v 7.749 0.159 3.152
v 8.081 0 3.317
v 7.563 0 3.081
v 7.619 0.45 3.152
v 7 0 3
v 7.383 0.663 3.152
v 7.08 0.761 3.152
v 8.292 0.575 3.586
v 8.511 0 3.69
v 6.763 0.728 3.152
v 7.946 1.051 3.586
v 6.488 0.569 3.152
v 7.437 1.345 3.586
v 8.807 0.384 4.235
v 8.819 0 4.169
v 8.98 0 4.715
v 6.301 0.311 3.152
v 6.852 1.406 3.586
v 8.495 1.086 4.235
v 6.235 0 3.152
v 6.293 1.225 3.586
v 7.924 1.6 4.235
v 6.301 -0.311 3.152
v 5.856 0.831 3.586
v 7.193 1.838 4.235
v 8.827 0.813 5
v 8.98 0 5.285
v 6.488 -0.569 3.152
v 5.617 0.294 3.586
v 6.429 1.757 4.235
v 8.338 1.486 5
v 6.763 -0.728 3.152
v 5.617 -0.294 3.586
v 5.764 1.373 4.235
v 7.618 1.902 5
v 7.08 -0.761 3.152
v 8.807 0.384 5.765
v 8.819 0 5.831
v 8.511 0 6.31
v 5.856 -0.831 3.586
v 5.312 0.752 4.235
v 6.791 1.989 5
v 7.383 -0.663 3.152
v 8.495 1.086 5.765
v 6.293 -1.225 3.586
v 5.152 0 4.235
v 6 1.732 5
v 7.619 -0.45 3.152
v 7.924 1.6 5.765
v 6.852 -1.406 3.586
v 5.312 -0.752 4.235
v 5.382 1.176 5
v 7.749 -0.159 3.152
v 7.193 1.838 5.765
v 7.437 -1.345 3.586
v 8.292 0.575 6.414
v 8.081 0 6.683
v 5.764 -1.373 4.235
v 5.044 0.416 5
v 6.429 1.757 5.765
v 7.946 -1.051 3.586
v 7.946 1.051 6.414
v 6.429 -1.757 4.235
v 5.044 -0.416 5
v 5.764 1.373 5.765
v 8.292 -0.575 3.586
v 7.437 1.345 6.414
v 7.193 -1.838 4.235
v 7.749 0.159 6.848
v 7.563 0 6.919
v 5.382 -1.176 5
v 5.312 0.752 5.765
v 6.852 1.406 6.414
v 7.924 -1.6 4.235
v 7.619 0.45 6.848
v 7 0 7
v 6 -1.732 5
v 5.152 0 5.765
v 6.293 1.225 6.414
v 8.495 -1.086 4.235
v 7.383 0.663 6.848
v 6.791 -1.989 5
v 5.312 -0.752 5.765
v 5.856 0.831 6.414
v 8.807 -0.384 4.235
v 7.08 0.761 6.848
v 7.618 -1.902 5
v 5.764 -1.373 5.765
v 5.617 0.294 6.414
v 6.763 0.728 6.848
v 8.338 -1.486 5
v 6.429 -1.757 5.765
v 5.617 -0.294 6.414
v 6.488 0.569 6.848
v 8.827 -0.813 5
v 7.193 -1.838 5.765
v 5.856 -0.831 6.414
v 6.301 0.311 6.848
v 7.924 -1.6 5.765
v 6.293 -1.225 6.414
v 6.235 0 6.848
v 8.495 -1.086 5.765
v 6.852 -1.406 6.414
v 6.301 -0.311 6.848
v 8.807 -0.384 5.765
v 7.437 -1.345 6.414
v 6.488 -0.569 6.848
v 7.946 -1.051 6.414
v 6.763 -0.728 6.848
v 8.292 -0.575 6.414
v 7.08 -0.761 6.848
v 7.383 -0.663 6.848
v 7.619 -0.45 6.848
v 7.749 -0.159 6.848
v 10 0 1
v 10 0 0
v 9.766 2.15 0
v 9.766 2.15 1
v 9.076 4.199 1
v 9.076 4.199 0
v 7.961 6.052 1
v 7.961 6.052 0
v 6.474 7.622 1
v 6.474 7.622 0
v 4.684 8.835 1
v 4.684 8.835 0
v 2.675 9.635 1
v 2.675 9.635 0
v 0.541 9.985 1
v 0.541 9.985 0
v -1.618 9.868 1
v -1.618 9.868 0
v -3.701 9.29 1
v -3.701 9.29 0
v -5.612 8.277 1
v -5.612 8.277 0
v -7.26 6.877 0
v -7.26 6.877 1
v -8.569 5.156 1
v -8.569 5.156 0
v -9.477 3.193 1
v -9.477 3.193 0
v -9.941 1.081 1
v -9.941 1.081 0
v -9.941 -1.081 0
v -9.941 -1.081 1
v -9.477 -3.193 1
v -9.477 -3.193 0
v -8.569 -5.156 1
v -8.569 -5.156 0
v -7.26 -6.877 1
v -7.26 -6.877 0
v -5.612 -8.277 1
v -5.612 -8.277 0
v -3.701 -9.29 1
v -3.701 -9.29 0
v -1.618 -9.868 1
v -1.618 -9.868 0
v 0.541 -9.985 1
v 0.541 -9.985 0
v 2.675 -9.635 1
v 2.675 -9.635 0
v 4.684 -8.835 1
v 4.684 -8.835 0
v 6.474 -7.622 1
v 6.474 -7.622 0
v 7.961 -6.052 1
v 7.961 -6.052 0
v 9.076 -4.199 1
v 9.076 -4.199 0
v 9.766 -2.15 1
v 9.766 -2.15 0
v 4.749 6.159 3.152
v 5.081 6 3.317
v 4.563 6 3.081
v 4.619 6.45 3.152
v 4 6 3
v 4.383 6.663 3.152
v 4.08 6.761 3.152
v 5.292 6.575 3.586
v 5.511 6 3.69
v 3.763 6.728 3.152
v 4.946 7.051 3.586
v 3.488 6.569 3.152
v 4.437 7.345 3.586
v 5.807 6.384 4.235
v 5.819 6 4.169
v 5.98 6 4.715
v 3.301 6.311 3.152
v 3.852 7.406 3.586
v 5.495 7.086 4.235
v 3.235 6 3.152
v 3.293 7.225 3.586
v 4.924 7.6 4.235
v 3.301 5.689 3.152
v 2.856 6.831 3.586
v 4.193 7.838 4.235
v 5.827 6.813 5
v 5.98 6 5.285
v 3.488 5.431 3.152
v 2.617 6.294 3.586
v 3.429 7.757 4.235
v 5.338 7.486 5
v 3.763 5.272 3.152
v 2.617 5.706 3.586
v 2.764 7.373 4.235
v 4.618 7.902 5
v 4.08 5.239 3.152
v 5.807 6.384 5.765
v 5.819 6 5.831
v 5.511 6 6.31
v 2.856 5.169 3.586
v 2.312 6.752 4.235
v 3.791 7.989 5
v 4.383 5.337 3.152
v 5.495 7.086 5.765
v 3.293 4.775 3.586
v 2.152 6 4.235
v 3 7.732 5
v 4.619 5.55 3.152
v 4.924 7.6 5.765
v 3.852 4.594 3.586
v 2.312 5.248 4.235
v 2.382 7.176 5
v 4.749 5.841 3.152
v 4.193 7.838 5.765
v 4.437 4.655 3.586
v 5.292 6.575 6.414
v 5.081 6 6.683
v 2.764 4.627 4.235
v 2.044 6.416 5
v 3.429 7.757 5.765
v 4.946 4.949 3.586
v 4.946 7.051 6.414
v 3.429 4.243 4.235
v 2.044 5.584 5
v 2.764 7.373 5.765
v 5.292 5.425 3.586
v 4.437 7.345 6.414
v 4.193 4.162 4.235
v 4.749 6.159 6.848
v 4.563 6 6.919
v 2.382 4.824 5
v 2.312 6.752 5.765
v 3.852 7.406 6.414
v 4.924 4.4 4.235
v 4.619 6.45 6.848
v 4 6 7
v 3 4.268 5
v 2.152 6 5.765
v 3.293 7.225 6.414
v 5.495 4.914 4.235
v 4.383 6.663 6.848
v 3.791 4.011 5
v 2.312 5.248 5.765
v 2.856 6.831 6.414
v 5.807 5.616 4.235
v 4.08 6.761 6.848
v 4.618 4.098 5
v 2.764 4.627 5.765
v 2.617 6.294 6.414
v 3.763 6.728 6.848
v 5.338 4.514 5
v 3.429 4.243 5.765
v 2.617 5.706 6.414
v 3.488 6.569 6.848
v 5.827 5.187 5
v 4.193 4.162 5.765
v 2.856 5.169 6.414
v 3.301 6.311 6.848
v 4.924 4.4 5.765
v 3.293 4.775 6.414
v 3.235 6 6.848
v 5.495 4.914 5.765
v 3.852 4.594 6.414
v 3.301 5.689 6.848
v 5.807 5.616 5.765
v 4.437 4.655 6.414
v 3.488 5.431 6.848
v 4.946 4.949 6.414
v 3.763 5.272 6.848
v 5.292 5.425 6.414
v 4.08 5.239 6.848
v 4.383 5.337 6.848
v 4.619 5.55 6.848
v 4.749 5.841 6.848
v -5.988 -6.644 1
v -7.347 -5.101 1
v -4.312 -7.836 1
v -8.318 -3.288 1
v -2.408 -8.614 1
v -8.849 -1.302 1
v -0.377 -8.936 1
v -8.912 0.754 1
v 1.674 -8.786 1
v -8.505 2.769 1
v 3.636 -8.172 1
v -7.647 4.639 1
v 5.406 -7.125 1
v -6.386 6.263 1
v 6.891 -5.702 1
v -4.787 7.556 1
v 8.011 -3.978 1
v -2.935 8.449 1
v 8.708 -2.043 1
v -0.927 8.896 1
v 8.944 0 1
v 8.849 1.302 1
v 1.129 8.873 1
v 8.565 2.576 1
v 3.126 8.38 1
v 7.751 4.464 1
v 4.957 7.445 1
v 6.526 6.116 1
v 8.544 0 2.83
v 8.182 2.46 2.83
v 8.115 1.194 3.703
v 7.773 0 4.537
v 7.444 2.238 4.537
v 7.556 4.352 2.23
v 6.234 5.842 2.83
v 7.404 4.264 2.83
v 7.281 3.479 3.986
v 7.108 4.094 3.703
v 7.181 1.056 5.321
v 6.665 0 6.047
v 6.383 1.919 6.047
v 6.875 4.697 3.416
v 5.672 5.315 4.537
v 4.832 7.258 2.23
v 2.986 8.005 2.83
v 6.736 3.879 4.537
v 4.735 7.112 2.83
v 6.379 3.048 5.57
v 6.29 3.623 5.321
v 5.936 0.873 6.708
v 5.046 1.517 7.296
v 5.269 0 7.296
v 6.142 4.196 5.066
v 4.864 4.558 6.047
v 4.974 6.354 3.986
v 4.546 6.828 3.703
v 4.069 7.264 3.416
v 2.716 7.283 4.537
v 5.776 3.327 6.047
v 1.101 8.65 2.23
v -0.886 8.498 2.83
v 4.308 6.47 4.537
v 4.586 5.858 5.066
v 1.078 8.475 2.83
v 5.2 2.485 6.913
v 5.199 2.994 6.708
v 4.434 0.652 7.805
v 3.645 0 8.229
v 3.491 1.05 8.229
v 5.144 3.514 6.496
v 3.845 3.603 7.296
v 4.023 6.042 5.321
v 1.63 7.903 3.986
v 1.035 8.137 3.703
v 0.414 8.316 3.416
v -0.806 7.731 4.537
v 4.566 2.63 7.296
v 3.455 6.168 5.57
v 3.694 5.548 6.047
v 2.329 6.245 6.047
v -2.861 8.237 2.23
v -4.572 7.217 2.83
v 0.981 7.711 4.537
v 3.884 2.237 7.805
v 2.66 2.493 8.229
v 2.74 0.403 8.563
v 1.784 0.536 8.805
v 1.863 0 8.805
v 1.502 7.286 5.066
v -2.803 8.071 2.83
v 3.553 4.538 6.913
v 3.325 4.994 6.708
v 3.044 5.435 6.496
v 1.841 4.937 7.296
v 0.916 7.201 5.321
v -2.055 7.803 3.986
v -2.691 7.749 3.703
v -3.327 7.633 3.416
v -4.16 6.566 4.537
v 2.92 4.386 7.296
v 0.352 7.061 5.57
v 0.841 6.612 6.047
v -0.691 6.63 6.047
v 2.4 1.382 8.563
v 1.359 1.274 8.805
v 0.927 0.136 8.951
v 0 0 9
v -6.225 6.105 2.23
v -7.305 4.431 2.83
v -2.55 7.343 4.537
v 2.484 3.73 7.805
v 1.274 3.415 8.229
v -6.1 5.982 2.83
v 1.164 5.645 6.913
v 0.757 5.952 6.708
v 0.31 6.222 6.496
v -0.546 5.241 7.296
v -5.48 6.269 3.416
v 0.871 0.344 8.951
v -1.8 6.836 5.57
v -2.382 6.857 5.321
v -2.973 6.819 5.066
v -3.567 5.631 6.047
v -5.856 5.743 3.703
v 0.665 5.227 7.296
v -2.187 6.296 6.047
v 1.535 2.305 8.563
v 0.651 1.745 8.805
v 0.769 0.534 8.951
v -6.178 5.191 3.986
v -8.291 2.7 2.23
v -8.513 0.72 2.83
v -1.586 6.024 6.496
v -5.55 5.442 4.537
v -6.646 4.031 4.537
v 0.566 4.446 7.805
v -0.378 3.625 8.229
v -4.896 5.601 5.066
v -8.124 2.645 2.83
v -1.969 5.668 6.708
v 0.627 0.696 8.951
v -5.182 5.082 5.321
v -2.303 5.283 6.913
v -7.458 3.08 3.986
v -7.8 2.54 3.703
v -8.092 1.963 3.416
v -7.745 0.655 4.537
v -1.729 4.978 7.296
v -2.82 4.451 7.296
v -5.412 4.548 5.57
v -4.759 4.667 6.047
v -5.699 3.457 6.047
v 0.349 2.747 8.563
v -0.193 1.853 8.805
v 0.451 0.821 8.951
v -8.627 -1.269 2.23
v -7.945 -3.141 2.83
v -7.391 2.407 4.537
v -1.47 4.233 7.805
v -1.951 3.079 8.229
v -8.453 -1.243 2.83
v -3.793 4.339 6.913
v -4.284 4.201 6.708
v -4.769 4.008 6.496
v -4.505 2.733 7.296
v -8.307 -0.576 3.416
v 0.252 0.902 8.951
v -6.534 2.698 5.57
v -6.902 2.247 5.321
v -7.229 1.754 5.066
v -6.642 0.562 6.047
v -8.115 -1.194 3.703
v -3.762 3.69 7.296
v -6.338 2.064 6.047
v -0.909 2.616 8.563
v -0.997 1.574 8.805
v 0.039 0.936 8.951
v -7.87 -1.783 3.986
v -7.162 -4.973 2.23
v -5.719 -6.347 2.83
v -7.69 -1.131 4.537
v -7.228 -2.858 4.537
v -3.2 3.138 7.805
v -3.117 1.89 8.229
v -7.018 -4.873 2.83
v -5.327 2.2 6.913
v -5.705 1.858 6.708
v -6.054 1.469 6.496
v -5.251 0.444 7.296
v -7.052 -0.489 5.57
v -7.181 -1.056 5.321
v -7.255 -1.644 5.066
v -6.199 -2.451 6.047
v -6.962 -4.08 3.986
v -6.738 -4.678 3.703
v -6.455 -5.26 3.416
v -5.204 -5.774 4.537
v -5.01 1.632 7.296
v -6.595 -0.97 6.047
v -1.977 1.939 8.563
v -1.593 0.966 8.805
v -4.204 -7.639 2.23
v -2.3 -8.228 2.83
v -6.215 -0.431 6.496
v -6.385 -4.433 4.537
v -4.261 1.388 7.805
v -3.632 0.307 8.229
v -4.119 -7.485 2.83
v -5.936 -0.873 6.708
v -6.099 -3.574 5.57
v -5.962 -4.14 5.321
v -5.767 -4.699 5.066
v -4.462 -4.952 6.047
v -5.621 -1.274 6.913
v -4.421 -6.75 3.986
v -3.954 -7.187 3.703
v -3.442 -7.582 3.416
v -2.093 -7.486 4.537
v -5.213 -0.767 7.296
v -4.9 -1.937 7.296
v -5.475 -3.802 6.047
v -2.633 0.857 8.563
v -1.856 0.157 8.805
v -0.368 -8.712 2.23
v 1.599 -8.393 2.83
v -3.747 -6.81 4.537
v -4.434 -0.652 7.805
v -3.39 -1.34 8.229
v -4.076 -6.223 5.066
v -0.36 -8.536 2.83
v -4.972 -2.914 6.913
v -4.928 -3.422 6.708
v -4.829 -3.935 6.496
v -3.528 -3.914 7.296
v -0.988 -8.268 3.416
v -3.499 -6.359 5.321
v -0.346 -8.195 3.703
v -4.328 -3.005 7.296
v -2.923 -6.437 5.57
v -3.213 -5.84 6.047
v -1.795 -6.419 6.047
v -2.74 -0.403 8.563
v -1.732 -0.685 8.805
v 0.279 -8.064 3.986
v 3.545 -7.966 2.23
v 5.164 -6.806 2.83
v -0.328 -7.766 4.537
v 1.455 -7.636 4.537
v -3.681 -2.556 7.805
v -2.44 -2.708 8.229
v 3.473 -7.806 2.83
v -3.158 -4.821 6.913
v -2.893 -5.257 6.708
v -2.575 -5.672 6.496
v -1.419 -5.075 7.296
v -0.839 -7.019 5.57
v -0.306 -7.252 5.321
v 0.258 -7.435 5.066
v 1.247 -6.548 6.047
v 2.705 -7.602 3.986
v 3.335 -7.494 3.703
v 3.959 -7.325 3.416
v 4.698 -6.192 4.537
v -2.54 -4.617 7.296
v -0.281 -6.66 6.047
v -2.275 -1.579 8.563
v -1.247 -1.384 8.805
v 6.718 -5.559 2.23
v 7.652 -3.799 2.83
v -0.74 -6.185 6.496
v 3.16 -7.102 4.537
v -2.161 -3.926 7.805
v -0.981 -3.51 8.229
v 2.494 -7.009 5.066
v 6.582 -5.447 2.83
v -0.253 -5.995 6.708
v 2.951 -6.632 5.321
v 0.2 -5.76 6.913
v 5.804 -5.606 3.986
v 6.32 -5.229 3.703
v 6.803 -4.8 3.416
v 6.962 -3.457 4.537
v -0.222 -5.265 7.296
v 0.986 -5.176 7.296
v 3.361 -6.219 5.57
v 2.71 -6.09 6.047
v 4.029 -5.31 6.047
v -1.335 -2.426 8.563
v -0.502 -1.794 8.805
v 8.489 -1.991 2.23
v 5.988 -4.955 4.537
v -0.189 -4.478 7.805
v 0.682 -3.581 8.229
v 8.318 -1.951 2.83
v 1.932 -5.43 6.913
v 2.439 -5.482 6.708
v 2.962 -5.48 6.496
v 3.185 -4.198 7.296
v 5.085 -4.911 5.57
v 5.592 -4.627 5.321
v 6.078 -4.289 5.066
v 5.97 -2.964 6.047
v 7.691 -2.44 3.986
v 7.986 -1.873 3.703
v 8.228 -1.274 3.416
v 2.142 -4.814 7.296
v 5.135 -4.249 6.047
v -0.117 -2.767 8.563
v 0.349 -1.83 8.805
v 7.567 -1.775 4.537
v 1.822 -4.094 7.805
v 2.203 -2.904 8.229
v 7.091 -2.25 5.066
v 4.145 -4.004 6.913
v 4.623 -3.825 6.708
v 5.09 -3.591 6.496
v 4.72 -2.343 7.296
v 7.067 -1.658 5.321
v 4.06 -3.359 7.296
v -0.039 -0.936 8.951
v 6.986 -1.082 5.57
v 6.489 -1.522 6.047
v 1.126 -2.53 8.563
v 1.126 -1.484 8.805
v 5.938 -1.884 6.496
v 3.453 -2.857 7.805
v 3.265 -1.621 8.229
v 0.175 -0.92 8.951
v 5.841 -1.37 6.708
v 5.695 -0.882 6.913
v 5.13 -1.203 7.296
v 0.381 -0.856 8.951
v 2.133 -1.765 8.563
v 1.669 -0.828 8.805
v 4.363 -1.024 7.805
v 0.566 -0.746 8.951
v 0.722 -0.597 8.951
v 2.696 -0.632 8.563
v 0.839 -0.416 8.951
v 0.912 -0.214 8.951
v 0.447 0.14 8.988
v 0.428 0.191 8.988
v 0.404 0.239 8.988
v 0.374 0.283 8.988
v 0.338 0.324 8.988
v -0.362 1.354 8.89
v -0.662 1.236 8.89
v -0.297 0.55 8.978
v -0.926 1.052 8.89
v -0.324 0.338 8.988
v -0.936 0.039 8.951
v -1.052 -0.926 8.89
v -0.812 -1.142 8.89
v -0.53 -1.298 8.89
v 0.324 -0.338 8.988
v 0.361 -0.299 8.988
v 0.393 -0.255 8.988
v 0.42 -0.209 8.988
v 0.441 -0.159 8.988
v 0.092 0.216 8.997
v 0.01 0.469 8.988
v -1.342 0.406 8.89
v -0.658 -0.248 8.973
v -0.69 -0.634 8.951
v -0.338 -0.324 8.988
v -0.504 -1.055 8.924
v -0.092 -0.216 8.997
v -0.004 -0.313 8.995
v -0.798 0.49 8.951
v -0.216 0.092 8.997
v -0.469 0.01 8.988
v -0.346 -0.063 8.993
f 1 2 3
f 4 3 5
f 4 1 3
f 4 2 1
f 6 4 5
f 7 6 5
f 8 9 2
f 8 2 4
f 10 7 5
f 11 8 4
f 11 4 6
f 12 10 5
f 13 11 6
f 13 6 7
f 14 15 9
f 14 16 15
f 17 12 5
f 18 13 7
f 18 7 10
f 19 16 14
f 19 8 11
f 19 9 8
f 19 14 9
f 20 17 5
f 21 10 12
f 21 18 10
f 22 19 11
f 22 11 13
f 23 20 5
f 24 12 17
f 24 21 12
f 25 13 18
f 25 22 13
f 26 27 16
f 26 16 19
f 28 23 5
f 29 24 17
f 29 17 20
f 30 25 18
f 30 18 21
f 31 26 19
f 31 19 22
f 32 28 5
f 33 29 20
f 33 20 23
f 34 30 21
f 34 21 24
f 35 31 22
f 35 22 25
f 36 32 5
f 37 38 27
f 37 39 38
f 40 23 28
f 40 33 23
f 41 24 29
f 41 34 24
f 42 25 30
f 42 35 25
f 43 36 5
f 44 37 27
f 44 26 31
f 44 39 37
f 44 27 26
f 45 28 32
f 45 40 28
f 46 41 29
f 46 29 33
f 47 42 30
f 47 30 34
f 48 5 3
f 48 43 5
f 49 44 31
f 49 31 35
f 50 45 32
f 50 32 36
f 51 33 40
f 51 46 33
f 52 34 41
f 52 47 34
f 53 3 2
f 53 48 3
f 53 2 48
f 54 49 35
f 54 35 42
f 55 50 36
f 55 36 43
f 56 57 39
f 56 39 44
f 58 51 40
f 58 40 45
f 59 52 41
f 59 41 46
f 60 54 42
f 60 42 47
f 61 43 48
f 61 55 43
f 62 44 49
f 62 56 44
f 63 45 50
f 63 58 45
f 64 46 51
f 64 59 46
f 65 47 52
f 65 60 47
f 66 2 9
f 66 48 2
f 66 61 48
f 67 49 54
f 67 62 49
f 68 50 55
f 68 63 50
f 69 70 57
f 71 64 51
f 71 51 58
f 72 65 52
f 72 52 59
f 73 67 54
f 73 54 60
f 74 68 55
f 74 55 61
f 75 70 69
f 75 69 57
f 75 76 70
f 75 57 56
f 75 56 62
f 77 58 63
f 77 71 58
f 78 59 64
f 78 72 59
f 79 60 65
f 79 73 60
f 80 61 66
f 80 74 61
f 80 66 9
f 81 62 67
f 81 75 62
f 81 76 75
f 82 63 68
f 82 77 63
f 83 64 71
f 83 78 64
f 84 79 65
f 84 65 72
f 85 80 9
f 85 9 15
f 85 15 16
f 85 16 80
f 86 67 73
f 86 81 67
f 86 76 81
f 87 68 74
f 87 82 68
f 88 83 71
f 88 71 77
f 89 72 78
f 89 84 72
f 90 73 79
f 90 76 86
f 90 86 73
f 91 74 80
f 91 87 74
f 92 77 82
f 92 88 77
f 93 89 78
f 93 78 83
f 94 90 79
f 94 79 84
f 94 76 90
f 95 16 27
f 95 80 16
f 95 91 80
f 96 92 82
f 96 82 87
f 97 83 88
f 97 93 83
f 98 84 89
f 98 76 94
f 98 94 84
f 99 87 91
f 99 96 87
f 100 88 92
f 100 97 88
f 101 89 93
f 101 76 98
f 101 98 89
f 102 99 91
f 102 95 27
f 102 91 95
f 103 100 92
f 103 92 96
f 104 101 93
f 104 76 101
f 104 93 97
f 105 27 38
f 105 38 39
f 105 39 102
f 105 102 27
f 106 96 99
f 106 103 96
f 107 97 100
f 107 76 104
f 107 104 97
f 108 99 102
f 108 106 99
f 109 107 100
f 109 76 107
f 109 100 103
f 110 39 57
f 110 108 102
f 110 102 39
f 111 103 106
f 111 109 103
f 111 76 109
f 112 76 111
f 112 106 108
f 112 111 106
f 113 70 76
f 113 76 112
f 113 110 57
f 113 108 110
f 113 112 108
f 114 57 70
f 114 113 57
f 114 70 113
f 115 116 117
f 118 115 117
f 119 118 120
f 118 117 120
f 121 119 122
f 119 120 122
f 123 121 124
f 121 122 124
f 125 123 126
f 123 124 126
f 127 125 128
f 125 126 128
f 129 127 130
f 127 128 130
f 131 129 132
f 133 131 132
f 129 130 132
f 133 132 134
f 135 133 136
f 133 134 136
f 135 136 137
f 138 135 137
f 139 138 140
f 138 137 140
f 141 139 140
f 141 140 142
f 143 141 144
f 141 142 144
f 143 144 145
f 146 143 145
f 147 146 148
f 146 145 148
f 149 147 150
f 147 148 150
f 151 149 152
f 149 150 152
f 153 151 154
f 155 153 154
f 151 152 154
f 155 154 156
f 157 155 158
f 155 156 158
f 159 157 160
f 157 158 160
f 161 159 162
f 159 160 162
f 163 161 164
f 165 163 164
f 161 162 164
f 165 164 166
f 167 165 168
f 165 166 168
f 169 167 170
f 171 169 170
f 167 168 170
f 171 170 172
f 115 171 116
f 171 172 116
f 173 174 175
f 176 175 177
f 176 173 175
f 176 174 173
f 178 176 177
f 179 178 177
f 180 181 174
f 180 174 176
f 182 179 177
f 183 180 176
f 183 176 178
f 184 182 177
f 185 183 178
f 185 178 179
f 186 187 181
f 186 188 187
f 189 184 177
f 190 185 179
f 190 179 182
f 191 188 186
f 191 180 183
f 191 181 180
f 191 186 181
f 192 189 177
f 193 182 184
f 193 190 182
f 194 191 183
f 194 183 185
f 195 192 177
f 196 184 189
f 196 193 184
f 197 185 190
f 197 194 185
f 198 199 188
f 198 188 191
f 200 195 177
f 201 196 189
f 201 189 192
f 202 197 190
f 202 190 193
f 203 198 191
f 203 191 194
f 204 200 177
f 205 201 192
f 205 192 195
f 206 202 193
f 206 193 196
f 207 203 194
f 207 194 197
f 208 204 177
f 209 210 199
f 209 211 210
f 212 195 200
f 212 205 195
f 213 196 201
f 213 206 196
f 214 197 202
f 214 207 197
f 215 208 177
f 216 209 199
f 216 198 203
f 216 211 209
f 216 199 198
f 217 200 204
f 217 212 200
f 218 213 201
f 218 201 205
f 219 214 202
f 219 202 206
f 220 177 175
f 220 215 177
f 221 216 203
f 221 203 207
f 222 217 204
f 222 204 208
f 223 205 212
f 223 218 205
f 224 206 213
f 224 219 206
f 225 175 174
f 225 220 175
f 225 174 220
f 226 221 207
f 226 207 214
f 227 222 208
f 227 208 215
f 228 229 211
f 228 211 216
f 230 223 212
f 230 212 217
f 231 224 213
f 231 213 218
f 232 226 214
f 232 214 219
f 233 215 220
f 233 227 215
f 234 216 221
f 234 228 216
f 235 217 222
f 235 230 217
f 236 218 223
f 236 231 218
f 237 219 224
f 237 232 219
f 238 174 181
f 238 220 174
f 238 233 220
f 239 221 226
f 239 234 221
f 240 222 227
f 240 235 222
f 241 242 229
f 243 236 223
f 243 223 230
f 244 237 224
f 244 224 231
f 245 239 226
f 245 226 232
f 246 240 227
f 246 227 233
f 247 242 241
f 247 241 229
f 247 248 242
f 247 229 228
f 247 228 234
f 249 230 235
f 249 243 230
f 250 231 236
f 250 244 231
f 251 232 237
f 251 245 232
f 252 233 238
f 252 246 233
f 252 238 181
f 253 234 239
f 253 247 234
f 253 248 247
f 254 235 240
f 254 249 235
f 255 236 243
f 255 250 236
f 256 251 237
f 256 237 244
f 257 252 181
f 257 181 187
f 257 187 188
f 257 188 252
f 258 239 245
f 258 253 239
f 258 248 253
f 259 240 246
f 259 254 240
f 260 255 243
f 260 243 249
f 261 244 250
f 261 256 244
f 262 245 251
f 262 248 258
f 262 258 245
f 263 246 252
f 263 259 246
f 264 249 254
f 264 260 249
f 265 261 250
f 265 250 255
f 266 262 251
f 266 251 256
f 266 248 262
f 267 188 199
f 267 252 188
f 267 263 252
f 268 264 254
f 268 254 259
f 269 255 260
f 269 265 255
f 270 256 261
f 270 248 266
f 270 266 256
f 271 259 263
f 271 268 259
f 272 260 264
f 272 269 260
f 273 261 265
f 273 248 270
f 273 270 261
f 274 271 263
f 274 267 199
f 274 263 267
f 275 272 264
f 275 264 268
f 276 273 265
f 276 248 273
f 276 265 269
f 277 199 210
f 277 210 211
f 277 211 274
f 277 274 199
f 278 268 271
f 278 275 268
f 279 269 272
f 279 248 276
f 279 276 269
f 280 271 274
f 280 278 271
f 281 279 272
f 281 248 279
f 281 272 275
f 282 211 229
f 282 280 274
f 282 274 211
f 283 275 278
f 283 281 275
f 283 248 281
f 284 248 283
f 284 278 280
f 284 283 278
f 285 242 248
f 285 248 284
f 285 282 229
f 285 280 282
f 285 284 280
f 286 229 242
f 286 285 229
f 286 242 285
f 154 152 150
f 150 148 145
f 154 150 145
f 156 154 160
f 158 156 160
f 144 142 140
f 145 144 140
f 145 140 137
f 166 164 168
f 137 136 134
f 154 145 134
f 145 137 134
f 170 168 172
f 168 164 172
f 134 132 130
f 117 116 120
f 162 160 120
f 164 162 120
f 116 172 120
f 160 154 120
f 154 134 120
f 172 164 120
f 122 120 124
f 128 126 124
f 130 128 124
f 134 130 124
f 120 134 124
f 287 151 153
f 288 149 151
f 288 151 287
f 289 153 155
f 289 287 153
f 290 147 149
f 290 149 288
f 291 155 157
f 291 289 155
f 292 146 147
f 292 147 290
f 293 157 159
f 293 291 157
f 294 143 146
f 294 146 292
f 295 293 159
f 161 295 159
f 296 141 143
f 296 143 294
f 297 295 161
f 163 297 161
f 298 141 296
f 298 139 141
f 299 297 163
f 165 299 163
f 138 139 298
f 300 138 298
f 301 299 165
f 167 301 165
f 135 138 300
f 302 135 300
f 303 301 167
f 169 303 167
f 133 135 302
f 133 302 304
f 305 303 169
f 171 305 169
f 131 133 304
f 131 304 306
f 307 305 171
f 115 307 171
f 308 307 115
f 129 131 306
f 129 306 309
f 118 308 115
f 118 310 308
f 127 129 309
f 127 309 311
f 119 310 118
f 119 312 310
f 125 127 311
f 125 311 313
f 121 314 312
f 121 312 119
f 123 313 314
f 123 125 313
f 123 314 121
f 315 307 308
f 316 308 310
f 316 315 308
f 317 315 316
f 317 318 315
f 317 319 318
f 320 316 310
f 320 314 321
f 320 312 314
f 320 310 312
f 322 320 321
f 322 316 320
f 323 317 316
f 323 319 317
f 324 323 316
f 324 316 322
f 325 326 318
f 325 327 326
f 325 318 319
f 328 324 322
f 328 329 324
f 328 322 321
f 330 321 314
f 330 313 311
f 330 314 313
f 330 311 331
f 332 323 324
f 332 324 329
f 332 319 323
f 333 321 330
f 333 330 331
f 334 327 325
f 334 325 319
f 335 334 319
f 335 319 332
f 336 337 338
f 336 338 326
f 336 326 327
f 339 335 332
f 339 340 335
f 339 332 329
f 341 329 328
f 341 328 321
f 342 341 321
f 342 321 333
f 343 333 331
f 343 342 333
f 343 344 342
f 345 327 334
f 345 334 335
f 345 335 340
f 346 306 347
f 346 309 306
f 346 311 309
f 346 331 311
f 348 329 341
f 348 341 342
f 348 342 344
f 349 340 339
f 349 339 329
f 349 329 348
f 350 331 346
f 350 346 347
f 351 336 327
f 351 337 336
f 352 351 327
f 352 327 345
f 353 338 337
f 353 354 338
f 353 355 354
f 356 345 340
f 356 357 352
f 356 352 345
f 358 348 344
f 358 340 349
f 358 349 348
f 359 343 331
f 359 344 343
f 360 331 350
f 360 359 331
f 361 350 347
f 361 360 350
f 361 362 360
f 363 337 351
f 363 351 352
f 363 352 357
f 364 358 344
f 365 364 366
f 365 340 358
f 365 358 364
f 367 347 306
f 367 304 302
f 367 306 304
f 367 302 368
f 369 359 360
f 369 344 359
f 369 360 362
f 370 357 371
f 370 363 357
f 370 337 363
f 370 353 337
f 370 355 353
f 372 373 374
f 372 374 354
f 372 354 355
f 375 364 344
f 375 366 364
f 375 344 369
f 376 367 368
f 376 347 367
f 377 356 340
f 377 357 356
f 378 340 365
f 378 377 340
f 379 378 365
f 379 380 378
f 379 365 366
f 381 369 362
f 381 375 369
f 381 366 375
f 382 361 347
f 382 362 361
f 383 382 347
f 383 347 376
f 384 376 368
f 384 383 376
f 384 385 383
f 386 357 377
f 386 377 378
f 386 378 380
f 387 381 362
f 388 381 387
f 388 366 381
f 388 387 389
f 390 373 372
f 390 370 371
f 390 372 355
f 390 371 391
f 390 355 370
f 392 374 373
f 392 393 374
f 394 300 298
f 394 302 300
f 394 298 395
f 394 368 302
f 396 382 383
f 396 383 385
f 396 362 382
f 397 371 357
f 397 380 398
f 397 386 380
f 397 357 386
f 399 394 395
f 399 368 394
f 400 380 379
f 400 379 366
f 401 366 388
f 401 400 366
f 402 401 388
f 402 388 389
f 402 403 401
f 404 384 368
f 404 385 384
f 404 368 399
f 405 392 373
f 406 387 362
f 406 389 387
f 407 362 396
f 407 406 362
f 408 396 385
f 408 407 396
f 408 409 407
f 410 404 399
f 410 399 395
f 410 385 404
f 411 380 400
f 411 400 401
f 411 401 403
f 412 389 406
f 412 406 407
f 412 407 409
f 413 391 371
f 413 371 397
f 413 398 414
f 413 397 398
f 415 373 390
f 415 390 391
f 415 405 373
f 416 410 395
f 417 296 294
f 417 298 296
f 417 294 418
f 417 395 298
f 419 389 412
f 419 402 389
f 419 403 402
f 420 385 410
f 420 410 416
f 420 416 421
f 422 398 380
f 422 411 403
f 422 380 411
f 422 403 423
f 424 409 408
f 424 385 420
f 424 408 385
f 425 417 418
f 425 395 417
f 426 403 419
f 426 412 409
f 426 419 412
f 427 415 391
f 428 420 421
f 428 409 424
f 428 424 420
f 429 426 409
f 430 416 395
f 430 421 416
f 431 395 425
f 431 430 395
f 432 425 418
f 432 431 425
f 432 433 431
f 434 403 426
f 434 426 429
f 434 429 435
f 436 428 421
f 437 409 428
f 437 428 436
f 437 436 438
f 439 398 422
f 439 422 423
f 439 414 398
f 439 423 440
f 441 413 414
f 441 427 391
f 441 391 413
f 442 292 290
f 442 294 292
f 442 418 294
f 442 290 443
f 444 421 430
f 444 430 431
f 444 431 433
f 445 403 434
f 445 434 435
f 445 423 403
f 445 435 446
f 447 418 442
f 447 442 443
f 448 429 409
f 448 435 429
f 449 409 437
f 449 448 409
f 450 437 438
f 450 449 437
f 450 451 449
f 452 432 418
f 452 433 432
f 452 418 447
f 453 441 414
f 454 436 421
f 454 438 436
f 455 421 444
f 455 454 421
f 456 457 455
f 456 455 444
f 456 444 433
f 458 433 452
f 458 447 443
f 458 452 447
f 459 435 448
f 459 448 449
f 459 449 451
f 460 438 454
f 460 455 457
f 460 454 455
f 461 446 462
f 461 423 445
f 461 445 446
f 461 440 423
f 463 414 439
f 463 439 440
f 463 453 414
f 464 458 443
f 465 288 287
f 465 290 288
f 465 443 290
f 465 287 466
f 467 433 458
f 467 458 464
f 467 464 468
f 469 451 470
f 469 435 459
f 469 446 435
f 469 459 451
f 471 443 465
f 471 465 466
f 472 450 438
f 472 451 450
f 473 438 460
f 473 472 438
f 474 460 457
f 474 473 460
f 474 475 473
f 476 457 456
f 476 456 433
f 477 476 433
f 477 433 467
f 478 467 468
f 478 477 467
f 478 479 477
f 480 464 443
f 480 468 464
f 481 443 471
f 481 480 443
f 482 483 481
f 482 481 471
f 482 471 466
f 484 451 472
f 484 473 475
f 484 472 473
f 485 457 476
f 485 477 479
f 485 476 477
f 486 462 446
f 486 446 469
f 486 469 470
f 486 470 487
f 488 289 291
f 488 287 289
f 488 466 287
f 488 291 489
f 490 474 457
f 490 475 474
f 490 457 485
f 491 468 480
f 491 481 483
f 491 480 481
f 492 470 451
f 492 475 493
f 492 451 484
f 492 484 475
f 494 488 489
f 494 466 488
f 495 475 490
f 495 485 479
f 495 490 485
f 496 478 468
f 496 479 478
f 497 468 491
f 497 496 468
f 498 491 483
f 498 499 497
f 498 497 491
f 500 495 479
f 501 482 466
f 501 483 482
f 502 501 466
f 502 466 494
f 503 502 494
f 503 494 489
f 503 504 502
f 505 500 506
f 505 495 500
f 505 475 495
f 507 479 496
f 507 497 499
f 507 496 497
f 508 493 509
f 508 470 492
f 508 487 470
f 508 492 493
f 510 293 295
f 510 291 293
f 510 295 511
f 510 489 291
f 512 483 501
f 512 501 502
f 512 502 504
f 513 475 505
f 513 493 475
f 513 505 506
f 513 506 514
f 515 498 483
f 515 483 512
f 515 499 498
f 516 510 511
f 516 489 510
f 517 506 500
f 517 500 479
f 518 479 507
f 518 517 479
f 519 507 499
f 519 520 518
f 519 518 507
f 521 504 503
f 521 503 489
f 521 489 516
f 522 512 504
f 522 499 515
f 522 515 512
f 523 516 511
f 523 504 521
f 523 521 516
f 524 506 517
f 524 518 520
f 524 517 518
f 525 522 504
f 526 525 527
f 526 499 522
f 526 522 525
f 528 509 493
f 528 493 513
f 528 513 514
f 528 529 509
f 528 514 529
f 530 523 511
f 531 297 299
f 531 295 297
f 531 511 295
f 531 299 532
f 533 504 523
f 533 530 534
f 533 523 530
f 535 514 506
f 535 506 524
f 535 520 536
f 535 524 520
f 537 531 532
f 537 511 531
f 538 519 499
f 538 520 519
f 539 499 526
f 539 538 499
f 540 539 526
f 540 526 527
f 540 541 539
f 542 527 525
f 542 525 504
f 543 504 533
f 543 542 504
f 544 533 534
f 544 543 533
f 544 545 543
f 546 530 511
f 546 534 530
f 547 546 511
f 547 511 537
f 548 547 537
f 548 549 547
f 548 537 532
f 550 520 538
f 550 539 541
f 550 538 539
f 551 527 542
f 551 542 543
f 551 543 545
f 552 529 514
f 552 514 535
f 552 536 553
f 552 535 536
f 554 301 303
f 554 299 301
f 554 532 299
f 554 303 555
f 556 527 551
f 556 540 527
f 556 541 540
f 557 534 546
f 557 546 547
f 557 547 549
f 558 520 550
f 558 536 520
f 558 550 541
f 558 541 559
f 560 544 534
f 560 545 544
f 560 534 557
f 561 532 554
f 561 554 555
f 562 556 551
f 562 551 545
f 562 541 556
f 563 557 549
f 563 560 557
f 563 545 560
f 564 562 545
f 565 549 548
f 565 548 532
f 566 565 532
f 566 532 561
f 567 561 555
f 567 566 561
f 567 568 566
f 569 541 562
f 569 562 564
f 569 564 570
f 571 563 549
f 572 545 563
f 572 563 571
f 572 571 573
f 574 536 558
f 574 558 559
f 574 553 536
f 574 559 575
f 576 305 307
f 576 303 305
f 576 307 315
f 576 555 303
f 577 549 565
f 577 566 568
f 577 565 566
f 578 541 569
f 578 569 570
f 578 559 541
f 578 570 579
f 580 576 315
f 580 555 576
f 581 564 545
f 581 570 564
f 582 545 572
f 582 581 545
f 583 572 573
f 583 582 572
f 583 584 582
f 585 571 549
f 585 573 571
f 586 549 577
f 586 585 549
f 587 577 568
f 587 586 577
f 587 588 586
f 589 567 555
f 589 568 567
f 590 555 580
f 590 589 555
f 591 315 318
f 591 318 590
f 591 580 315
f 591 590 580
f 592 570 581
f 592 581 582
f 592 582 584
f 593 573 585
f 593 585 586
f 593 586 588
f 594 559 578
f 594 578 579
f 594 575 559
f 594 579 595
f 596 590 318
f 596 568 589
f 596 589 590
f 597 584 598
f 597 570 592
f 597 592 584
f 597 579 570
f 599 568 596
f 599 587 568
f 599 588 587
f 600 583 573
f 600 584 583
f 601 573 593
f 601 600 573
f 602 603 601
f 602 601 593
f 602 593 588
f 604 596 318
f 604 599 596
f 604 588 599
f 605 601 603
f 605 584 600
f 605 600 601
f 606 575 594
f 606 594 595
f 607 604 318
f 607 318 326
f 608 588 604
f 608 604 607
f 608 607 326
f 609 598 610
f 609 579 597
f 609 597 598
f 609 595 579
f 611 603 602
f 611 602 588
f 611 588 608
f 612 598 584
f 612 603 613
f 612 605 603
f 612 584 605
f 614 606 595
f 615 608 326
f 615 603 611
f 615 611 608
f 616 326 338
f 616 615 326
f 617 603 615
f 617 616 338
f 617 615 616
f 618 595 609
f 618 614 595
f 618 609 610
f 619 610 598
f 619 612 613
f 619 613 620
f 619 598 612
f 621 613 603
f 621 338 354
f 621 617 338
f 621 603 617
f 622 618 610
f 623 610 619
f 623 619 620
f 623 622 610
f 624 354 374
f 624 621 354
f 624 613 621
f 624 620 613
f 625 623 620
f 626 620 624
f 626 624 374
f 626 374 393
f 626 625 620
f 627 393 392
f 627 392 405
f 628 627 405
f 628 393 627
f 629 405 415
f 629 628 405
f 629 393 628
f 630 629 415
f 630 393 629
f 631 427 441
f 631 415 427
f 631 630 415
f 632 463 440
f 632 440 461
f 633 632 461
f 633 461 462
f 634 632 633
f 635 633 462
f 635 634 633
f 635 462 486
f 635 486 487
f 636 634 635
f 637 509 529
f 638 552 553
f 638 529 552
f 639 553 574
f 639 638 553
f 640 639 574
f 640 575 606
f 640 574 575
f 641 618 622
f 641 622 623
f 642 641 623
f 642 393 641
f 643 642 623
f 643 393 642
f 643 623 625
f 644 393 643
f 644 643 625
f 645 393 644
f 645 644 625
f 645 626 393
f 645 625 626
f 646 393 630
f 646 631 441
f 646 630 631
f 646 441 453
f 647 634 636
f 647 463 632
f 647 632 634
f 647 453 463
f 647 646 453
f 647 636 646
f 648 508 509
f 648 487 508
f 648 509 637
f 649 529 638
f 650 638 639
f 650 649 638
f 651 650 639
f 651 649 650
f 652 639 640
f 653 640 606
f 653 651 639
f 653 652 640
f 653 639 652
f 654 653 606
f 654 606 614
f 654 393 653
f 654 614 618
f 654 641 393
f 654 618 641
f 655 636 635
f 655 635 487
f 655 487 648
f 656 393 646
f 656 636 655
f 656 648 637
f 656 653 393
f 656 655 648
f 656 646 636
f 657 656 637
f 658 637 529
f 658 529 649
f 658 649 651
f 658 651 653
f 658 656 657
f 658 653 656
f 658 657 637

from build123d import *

# Parameters (mm, degrees)
CYLINDER_R     = 10
CYLINDER_DEPTH = 1


with BuildPart() as cylinder:
    # Cylinder → Cylinder (new body)
    with BuildSketch(Plane.XY):
        Circle(CYLINDER_R)
    extrude(amount=CYLINDER_DEPTH)


with BuildPart() as fusion:
    # Sphere → Sphere (revolve)
    with BuildSketch(Plane.XZ):
        with BuildLine():
            ThreePointArc((9, 0), (6.363961, 6.363961), (0, 9))
            Line((0, 9), (0, 0))
            Line((0, 0), (9, 0))
        make_face()
    revolve(axis=Axis((0, 0, 0), (0, 0, 1)))

    # Fusion: union Cylinder
    add(cylinder.part)


with BuildPart() as sphere001:
    # Sphere001 → Sphere001 (revolve)
    with BuildSketch(Plane(origin=(7, 0, 5), x_dir=(1, 0, 0), z_dir=(0, -1, 0))):
        with BuildLine():
            ThreePointArc((0, -2), (2, 0), (0, 2))
            Line((0, 2), (0, -2))
        make_face()
    revolve(axis=Axis((7, 0, 5), (0, 0, 1)))


with BuildPart() as sphere002:
    # Sphere002 → Sphere002 (revolve)
    with BuildSketch(Plane(origin=(4, 6, 5), x_dir=(1, 0, 0), z_dir=(0, -1, 0))):
        with BuildLine():
            ThreePointArc((0, -2), (2, 0), (0, 2))
            Line((0, 2), (0, -2))
        make_face()
    revolve(axis=Axis((4, 6, 5), (0, 0, 1)))


solid = Compound([fusion.part, sphere001.part, sphere002.part])
